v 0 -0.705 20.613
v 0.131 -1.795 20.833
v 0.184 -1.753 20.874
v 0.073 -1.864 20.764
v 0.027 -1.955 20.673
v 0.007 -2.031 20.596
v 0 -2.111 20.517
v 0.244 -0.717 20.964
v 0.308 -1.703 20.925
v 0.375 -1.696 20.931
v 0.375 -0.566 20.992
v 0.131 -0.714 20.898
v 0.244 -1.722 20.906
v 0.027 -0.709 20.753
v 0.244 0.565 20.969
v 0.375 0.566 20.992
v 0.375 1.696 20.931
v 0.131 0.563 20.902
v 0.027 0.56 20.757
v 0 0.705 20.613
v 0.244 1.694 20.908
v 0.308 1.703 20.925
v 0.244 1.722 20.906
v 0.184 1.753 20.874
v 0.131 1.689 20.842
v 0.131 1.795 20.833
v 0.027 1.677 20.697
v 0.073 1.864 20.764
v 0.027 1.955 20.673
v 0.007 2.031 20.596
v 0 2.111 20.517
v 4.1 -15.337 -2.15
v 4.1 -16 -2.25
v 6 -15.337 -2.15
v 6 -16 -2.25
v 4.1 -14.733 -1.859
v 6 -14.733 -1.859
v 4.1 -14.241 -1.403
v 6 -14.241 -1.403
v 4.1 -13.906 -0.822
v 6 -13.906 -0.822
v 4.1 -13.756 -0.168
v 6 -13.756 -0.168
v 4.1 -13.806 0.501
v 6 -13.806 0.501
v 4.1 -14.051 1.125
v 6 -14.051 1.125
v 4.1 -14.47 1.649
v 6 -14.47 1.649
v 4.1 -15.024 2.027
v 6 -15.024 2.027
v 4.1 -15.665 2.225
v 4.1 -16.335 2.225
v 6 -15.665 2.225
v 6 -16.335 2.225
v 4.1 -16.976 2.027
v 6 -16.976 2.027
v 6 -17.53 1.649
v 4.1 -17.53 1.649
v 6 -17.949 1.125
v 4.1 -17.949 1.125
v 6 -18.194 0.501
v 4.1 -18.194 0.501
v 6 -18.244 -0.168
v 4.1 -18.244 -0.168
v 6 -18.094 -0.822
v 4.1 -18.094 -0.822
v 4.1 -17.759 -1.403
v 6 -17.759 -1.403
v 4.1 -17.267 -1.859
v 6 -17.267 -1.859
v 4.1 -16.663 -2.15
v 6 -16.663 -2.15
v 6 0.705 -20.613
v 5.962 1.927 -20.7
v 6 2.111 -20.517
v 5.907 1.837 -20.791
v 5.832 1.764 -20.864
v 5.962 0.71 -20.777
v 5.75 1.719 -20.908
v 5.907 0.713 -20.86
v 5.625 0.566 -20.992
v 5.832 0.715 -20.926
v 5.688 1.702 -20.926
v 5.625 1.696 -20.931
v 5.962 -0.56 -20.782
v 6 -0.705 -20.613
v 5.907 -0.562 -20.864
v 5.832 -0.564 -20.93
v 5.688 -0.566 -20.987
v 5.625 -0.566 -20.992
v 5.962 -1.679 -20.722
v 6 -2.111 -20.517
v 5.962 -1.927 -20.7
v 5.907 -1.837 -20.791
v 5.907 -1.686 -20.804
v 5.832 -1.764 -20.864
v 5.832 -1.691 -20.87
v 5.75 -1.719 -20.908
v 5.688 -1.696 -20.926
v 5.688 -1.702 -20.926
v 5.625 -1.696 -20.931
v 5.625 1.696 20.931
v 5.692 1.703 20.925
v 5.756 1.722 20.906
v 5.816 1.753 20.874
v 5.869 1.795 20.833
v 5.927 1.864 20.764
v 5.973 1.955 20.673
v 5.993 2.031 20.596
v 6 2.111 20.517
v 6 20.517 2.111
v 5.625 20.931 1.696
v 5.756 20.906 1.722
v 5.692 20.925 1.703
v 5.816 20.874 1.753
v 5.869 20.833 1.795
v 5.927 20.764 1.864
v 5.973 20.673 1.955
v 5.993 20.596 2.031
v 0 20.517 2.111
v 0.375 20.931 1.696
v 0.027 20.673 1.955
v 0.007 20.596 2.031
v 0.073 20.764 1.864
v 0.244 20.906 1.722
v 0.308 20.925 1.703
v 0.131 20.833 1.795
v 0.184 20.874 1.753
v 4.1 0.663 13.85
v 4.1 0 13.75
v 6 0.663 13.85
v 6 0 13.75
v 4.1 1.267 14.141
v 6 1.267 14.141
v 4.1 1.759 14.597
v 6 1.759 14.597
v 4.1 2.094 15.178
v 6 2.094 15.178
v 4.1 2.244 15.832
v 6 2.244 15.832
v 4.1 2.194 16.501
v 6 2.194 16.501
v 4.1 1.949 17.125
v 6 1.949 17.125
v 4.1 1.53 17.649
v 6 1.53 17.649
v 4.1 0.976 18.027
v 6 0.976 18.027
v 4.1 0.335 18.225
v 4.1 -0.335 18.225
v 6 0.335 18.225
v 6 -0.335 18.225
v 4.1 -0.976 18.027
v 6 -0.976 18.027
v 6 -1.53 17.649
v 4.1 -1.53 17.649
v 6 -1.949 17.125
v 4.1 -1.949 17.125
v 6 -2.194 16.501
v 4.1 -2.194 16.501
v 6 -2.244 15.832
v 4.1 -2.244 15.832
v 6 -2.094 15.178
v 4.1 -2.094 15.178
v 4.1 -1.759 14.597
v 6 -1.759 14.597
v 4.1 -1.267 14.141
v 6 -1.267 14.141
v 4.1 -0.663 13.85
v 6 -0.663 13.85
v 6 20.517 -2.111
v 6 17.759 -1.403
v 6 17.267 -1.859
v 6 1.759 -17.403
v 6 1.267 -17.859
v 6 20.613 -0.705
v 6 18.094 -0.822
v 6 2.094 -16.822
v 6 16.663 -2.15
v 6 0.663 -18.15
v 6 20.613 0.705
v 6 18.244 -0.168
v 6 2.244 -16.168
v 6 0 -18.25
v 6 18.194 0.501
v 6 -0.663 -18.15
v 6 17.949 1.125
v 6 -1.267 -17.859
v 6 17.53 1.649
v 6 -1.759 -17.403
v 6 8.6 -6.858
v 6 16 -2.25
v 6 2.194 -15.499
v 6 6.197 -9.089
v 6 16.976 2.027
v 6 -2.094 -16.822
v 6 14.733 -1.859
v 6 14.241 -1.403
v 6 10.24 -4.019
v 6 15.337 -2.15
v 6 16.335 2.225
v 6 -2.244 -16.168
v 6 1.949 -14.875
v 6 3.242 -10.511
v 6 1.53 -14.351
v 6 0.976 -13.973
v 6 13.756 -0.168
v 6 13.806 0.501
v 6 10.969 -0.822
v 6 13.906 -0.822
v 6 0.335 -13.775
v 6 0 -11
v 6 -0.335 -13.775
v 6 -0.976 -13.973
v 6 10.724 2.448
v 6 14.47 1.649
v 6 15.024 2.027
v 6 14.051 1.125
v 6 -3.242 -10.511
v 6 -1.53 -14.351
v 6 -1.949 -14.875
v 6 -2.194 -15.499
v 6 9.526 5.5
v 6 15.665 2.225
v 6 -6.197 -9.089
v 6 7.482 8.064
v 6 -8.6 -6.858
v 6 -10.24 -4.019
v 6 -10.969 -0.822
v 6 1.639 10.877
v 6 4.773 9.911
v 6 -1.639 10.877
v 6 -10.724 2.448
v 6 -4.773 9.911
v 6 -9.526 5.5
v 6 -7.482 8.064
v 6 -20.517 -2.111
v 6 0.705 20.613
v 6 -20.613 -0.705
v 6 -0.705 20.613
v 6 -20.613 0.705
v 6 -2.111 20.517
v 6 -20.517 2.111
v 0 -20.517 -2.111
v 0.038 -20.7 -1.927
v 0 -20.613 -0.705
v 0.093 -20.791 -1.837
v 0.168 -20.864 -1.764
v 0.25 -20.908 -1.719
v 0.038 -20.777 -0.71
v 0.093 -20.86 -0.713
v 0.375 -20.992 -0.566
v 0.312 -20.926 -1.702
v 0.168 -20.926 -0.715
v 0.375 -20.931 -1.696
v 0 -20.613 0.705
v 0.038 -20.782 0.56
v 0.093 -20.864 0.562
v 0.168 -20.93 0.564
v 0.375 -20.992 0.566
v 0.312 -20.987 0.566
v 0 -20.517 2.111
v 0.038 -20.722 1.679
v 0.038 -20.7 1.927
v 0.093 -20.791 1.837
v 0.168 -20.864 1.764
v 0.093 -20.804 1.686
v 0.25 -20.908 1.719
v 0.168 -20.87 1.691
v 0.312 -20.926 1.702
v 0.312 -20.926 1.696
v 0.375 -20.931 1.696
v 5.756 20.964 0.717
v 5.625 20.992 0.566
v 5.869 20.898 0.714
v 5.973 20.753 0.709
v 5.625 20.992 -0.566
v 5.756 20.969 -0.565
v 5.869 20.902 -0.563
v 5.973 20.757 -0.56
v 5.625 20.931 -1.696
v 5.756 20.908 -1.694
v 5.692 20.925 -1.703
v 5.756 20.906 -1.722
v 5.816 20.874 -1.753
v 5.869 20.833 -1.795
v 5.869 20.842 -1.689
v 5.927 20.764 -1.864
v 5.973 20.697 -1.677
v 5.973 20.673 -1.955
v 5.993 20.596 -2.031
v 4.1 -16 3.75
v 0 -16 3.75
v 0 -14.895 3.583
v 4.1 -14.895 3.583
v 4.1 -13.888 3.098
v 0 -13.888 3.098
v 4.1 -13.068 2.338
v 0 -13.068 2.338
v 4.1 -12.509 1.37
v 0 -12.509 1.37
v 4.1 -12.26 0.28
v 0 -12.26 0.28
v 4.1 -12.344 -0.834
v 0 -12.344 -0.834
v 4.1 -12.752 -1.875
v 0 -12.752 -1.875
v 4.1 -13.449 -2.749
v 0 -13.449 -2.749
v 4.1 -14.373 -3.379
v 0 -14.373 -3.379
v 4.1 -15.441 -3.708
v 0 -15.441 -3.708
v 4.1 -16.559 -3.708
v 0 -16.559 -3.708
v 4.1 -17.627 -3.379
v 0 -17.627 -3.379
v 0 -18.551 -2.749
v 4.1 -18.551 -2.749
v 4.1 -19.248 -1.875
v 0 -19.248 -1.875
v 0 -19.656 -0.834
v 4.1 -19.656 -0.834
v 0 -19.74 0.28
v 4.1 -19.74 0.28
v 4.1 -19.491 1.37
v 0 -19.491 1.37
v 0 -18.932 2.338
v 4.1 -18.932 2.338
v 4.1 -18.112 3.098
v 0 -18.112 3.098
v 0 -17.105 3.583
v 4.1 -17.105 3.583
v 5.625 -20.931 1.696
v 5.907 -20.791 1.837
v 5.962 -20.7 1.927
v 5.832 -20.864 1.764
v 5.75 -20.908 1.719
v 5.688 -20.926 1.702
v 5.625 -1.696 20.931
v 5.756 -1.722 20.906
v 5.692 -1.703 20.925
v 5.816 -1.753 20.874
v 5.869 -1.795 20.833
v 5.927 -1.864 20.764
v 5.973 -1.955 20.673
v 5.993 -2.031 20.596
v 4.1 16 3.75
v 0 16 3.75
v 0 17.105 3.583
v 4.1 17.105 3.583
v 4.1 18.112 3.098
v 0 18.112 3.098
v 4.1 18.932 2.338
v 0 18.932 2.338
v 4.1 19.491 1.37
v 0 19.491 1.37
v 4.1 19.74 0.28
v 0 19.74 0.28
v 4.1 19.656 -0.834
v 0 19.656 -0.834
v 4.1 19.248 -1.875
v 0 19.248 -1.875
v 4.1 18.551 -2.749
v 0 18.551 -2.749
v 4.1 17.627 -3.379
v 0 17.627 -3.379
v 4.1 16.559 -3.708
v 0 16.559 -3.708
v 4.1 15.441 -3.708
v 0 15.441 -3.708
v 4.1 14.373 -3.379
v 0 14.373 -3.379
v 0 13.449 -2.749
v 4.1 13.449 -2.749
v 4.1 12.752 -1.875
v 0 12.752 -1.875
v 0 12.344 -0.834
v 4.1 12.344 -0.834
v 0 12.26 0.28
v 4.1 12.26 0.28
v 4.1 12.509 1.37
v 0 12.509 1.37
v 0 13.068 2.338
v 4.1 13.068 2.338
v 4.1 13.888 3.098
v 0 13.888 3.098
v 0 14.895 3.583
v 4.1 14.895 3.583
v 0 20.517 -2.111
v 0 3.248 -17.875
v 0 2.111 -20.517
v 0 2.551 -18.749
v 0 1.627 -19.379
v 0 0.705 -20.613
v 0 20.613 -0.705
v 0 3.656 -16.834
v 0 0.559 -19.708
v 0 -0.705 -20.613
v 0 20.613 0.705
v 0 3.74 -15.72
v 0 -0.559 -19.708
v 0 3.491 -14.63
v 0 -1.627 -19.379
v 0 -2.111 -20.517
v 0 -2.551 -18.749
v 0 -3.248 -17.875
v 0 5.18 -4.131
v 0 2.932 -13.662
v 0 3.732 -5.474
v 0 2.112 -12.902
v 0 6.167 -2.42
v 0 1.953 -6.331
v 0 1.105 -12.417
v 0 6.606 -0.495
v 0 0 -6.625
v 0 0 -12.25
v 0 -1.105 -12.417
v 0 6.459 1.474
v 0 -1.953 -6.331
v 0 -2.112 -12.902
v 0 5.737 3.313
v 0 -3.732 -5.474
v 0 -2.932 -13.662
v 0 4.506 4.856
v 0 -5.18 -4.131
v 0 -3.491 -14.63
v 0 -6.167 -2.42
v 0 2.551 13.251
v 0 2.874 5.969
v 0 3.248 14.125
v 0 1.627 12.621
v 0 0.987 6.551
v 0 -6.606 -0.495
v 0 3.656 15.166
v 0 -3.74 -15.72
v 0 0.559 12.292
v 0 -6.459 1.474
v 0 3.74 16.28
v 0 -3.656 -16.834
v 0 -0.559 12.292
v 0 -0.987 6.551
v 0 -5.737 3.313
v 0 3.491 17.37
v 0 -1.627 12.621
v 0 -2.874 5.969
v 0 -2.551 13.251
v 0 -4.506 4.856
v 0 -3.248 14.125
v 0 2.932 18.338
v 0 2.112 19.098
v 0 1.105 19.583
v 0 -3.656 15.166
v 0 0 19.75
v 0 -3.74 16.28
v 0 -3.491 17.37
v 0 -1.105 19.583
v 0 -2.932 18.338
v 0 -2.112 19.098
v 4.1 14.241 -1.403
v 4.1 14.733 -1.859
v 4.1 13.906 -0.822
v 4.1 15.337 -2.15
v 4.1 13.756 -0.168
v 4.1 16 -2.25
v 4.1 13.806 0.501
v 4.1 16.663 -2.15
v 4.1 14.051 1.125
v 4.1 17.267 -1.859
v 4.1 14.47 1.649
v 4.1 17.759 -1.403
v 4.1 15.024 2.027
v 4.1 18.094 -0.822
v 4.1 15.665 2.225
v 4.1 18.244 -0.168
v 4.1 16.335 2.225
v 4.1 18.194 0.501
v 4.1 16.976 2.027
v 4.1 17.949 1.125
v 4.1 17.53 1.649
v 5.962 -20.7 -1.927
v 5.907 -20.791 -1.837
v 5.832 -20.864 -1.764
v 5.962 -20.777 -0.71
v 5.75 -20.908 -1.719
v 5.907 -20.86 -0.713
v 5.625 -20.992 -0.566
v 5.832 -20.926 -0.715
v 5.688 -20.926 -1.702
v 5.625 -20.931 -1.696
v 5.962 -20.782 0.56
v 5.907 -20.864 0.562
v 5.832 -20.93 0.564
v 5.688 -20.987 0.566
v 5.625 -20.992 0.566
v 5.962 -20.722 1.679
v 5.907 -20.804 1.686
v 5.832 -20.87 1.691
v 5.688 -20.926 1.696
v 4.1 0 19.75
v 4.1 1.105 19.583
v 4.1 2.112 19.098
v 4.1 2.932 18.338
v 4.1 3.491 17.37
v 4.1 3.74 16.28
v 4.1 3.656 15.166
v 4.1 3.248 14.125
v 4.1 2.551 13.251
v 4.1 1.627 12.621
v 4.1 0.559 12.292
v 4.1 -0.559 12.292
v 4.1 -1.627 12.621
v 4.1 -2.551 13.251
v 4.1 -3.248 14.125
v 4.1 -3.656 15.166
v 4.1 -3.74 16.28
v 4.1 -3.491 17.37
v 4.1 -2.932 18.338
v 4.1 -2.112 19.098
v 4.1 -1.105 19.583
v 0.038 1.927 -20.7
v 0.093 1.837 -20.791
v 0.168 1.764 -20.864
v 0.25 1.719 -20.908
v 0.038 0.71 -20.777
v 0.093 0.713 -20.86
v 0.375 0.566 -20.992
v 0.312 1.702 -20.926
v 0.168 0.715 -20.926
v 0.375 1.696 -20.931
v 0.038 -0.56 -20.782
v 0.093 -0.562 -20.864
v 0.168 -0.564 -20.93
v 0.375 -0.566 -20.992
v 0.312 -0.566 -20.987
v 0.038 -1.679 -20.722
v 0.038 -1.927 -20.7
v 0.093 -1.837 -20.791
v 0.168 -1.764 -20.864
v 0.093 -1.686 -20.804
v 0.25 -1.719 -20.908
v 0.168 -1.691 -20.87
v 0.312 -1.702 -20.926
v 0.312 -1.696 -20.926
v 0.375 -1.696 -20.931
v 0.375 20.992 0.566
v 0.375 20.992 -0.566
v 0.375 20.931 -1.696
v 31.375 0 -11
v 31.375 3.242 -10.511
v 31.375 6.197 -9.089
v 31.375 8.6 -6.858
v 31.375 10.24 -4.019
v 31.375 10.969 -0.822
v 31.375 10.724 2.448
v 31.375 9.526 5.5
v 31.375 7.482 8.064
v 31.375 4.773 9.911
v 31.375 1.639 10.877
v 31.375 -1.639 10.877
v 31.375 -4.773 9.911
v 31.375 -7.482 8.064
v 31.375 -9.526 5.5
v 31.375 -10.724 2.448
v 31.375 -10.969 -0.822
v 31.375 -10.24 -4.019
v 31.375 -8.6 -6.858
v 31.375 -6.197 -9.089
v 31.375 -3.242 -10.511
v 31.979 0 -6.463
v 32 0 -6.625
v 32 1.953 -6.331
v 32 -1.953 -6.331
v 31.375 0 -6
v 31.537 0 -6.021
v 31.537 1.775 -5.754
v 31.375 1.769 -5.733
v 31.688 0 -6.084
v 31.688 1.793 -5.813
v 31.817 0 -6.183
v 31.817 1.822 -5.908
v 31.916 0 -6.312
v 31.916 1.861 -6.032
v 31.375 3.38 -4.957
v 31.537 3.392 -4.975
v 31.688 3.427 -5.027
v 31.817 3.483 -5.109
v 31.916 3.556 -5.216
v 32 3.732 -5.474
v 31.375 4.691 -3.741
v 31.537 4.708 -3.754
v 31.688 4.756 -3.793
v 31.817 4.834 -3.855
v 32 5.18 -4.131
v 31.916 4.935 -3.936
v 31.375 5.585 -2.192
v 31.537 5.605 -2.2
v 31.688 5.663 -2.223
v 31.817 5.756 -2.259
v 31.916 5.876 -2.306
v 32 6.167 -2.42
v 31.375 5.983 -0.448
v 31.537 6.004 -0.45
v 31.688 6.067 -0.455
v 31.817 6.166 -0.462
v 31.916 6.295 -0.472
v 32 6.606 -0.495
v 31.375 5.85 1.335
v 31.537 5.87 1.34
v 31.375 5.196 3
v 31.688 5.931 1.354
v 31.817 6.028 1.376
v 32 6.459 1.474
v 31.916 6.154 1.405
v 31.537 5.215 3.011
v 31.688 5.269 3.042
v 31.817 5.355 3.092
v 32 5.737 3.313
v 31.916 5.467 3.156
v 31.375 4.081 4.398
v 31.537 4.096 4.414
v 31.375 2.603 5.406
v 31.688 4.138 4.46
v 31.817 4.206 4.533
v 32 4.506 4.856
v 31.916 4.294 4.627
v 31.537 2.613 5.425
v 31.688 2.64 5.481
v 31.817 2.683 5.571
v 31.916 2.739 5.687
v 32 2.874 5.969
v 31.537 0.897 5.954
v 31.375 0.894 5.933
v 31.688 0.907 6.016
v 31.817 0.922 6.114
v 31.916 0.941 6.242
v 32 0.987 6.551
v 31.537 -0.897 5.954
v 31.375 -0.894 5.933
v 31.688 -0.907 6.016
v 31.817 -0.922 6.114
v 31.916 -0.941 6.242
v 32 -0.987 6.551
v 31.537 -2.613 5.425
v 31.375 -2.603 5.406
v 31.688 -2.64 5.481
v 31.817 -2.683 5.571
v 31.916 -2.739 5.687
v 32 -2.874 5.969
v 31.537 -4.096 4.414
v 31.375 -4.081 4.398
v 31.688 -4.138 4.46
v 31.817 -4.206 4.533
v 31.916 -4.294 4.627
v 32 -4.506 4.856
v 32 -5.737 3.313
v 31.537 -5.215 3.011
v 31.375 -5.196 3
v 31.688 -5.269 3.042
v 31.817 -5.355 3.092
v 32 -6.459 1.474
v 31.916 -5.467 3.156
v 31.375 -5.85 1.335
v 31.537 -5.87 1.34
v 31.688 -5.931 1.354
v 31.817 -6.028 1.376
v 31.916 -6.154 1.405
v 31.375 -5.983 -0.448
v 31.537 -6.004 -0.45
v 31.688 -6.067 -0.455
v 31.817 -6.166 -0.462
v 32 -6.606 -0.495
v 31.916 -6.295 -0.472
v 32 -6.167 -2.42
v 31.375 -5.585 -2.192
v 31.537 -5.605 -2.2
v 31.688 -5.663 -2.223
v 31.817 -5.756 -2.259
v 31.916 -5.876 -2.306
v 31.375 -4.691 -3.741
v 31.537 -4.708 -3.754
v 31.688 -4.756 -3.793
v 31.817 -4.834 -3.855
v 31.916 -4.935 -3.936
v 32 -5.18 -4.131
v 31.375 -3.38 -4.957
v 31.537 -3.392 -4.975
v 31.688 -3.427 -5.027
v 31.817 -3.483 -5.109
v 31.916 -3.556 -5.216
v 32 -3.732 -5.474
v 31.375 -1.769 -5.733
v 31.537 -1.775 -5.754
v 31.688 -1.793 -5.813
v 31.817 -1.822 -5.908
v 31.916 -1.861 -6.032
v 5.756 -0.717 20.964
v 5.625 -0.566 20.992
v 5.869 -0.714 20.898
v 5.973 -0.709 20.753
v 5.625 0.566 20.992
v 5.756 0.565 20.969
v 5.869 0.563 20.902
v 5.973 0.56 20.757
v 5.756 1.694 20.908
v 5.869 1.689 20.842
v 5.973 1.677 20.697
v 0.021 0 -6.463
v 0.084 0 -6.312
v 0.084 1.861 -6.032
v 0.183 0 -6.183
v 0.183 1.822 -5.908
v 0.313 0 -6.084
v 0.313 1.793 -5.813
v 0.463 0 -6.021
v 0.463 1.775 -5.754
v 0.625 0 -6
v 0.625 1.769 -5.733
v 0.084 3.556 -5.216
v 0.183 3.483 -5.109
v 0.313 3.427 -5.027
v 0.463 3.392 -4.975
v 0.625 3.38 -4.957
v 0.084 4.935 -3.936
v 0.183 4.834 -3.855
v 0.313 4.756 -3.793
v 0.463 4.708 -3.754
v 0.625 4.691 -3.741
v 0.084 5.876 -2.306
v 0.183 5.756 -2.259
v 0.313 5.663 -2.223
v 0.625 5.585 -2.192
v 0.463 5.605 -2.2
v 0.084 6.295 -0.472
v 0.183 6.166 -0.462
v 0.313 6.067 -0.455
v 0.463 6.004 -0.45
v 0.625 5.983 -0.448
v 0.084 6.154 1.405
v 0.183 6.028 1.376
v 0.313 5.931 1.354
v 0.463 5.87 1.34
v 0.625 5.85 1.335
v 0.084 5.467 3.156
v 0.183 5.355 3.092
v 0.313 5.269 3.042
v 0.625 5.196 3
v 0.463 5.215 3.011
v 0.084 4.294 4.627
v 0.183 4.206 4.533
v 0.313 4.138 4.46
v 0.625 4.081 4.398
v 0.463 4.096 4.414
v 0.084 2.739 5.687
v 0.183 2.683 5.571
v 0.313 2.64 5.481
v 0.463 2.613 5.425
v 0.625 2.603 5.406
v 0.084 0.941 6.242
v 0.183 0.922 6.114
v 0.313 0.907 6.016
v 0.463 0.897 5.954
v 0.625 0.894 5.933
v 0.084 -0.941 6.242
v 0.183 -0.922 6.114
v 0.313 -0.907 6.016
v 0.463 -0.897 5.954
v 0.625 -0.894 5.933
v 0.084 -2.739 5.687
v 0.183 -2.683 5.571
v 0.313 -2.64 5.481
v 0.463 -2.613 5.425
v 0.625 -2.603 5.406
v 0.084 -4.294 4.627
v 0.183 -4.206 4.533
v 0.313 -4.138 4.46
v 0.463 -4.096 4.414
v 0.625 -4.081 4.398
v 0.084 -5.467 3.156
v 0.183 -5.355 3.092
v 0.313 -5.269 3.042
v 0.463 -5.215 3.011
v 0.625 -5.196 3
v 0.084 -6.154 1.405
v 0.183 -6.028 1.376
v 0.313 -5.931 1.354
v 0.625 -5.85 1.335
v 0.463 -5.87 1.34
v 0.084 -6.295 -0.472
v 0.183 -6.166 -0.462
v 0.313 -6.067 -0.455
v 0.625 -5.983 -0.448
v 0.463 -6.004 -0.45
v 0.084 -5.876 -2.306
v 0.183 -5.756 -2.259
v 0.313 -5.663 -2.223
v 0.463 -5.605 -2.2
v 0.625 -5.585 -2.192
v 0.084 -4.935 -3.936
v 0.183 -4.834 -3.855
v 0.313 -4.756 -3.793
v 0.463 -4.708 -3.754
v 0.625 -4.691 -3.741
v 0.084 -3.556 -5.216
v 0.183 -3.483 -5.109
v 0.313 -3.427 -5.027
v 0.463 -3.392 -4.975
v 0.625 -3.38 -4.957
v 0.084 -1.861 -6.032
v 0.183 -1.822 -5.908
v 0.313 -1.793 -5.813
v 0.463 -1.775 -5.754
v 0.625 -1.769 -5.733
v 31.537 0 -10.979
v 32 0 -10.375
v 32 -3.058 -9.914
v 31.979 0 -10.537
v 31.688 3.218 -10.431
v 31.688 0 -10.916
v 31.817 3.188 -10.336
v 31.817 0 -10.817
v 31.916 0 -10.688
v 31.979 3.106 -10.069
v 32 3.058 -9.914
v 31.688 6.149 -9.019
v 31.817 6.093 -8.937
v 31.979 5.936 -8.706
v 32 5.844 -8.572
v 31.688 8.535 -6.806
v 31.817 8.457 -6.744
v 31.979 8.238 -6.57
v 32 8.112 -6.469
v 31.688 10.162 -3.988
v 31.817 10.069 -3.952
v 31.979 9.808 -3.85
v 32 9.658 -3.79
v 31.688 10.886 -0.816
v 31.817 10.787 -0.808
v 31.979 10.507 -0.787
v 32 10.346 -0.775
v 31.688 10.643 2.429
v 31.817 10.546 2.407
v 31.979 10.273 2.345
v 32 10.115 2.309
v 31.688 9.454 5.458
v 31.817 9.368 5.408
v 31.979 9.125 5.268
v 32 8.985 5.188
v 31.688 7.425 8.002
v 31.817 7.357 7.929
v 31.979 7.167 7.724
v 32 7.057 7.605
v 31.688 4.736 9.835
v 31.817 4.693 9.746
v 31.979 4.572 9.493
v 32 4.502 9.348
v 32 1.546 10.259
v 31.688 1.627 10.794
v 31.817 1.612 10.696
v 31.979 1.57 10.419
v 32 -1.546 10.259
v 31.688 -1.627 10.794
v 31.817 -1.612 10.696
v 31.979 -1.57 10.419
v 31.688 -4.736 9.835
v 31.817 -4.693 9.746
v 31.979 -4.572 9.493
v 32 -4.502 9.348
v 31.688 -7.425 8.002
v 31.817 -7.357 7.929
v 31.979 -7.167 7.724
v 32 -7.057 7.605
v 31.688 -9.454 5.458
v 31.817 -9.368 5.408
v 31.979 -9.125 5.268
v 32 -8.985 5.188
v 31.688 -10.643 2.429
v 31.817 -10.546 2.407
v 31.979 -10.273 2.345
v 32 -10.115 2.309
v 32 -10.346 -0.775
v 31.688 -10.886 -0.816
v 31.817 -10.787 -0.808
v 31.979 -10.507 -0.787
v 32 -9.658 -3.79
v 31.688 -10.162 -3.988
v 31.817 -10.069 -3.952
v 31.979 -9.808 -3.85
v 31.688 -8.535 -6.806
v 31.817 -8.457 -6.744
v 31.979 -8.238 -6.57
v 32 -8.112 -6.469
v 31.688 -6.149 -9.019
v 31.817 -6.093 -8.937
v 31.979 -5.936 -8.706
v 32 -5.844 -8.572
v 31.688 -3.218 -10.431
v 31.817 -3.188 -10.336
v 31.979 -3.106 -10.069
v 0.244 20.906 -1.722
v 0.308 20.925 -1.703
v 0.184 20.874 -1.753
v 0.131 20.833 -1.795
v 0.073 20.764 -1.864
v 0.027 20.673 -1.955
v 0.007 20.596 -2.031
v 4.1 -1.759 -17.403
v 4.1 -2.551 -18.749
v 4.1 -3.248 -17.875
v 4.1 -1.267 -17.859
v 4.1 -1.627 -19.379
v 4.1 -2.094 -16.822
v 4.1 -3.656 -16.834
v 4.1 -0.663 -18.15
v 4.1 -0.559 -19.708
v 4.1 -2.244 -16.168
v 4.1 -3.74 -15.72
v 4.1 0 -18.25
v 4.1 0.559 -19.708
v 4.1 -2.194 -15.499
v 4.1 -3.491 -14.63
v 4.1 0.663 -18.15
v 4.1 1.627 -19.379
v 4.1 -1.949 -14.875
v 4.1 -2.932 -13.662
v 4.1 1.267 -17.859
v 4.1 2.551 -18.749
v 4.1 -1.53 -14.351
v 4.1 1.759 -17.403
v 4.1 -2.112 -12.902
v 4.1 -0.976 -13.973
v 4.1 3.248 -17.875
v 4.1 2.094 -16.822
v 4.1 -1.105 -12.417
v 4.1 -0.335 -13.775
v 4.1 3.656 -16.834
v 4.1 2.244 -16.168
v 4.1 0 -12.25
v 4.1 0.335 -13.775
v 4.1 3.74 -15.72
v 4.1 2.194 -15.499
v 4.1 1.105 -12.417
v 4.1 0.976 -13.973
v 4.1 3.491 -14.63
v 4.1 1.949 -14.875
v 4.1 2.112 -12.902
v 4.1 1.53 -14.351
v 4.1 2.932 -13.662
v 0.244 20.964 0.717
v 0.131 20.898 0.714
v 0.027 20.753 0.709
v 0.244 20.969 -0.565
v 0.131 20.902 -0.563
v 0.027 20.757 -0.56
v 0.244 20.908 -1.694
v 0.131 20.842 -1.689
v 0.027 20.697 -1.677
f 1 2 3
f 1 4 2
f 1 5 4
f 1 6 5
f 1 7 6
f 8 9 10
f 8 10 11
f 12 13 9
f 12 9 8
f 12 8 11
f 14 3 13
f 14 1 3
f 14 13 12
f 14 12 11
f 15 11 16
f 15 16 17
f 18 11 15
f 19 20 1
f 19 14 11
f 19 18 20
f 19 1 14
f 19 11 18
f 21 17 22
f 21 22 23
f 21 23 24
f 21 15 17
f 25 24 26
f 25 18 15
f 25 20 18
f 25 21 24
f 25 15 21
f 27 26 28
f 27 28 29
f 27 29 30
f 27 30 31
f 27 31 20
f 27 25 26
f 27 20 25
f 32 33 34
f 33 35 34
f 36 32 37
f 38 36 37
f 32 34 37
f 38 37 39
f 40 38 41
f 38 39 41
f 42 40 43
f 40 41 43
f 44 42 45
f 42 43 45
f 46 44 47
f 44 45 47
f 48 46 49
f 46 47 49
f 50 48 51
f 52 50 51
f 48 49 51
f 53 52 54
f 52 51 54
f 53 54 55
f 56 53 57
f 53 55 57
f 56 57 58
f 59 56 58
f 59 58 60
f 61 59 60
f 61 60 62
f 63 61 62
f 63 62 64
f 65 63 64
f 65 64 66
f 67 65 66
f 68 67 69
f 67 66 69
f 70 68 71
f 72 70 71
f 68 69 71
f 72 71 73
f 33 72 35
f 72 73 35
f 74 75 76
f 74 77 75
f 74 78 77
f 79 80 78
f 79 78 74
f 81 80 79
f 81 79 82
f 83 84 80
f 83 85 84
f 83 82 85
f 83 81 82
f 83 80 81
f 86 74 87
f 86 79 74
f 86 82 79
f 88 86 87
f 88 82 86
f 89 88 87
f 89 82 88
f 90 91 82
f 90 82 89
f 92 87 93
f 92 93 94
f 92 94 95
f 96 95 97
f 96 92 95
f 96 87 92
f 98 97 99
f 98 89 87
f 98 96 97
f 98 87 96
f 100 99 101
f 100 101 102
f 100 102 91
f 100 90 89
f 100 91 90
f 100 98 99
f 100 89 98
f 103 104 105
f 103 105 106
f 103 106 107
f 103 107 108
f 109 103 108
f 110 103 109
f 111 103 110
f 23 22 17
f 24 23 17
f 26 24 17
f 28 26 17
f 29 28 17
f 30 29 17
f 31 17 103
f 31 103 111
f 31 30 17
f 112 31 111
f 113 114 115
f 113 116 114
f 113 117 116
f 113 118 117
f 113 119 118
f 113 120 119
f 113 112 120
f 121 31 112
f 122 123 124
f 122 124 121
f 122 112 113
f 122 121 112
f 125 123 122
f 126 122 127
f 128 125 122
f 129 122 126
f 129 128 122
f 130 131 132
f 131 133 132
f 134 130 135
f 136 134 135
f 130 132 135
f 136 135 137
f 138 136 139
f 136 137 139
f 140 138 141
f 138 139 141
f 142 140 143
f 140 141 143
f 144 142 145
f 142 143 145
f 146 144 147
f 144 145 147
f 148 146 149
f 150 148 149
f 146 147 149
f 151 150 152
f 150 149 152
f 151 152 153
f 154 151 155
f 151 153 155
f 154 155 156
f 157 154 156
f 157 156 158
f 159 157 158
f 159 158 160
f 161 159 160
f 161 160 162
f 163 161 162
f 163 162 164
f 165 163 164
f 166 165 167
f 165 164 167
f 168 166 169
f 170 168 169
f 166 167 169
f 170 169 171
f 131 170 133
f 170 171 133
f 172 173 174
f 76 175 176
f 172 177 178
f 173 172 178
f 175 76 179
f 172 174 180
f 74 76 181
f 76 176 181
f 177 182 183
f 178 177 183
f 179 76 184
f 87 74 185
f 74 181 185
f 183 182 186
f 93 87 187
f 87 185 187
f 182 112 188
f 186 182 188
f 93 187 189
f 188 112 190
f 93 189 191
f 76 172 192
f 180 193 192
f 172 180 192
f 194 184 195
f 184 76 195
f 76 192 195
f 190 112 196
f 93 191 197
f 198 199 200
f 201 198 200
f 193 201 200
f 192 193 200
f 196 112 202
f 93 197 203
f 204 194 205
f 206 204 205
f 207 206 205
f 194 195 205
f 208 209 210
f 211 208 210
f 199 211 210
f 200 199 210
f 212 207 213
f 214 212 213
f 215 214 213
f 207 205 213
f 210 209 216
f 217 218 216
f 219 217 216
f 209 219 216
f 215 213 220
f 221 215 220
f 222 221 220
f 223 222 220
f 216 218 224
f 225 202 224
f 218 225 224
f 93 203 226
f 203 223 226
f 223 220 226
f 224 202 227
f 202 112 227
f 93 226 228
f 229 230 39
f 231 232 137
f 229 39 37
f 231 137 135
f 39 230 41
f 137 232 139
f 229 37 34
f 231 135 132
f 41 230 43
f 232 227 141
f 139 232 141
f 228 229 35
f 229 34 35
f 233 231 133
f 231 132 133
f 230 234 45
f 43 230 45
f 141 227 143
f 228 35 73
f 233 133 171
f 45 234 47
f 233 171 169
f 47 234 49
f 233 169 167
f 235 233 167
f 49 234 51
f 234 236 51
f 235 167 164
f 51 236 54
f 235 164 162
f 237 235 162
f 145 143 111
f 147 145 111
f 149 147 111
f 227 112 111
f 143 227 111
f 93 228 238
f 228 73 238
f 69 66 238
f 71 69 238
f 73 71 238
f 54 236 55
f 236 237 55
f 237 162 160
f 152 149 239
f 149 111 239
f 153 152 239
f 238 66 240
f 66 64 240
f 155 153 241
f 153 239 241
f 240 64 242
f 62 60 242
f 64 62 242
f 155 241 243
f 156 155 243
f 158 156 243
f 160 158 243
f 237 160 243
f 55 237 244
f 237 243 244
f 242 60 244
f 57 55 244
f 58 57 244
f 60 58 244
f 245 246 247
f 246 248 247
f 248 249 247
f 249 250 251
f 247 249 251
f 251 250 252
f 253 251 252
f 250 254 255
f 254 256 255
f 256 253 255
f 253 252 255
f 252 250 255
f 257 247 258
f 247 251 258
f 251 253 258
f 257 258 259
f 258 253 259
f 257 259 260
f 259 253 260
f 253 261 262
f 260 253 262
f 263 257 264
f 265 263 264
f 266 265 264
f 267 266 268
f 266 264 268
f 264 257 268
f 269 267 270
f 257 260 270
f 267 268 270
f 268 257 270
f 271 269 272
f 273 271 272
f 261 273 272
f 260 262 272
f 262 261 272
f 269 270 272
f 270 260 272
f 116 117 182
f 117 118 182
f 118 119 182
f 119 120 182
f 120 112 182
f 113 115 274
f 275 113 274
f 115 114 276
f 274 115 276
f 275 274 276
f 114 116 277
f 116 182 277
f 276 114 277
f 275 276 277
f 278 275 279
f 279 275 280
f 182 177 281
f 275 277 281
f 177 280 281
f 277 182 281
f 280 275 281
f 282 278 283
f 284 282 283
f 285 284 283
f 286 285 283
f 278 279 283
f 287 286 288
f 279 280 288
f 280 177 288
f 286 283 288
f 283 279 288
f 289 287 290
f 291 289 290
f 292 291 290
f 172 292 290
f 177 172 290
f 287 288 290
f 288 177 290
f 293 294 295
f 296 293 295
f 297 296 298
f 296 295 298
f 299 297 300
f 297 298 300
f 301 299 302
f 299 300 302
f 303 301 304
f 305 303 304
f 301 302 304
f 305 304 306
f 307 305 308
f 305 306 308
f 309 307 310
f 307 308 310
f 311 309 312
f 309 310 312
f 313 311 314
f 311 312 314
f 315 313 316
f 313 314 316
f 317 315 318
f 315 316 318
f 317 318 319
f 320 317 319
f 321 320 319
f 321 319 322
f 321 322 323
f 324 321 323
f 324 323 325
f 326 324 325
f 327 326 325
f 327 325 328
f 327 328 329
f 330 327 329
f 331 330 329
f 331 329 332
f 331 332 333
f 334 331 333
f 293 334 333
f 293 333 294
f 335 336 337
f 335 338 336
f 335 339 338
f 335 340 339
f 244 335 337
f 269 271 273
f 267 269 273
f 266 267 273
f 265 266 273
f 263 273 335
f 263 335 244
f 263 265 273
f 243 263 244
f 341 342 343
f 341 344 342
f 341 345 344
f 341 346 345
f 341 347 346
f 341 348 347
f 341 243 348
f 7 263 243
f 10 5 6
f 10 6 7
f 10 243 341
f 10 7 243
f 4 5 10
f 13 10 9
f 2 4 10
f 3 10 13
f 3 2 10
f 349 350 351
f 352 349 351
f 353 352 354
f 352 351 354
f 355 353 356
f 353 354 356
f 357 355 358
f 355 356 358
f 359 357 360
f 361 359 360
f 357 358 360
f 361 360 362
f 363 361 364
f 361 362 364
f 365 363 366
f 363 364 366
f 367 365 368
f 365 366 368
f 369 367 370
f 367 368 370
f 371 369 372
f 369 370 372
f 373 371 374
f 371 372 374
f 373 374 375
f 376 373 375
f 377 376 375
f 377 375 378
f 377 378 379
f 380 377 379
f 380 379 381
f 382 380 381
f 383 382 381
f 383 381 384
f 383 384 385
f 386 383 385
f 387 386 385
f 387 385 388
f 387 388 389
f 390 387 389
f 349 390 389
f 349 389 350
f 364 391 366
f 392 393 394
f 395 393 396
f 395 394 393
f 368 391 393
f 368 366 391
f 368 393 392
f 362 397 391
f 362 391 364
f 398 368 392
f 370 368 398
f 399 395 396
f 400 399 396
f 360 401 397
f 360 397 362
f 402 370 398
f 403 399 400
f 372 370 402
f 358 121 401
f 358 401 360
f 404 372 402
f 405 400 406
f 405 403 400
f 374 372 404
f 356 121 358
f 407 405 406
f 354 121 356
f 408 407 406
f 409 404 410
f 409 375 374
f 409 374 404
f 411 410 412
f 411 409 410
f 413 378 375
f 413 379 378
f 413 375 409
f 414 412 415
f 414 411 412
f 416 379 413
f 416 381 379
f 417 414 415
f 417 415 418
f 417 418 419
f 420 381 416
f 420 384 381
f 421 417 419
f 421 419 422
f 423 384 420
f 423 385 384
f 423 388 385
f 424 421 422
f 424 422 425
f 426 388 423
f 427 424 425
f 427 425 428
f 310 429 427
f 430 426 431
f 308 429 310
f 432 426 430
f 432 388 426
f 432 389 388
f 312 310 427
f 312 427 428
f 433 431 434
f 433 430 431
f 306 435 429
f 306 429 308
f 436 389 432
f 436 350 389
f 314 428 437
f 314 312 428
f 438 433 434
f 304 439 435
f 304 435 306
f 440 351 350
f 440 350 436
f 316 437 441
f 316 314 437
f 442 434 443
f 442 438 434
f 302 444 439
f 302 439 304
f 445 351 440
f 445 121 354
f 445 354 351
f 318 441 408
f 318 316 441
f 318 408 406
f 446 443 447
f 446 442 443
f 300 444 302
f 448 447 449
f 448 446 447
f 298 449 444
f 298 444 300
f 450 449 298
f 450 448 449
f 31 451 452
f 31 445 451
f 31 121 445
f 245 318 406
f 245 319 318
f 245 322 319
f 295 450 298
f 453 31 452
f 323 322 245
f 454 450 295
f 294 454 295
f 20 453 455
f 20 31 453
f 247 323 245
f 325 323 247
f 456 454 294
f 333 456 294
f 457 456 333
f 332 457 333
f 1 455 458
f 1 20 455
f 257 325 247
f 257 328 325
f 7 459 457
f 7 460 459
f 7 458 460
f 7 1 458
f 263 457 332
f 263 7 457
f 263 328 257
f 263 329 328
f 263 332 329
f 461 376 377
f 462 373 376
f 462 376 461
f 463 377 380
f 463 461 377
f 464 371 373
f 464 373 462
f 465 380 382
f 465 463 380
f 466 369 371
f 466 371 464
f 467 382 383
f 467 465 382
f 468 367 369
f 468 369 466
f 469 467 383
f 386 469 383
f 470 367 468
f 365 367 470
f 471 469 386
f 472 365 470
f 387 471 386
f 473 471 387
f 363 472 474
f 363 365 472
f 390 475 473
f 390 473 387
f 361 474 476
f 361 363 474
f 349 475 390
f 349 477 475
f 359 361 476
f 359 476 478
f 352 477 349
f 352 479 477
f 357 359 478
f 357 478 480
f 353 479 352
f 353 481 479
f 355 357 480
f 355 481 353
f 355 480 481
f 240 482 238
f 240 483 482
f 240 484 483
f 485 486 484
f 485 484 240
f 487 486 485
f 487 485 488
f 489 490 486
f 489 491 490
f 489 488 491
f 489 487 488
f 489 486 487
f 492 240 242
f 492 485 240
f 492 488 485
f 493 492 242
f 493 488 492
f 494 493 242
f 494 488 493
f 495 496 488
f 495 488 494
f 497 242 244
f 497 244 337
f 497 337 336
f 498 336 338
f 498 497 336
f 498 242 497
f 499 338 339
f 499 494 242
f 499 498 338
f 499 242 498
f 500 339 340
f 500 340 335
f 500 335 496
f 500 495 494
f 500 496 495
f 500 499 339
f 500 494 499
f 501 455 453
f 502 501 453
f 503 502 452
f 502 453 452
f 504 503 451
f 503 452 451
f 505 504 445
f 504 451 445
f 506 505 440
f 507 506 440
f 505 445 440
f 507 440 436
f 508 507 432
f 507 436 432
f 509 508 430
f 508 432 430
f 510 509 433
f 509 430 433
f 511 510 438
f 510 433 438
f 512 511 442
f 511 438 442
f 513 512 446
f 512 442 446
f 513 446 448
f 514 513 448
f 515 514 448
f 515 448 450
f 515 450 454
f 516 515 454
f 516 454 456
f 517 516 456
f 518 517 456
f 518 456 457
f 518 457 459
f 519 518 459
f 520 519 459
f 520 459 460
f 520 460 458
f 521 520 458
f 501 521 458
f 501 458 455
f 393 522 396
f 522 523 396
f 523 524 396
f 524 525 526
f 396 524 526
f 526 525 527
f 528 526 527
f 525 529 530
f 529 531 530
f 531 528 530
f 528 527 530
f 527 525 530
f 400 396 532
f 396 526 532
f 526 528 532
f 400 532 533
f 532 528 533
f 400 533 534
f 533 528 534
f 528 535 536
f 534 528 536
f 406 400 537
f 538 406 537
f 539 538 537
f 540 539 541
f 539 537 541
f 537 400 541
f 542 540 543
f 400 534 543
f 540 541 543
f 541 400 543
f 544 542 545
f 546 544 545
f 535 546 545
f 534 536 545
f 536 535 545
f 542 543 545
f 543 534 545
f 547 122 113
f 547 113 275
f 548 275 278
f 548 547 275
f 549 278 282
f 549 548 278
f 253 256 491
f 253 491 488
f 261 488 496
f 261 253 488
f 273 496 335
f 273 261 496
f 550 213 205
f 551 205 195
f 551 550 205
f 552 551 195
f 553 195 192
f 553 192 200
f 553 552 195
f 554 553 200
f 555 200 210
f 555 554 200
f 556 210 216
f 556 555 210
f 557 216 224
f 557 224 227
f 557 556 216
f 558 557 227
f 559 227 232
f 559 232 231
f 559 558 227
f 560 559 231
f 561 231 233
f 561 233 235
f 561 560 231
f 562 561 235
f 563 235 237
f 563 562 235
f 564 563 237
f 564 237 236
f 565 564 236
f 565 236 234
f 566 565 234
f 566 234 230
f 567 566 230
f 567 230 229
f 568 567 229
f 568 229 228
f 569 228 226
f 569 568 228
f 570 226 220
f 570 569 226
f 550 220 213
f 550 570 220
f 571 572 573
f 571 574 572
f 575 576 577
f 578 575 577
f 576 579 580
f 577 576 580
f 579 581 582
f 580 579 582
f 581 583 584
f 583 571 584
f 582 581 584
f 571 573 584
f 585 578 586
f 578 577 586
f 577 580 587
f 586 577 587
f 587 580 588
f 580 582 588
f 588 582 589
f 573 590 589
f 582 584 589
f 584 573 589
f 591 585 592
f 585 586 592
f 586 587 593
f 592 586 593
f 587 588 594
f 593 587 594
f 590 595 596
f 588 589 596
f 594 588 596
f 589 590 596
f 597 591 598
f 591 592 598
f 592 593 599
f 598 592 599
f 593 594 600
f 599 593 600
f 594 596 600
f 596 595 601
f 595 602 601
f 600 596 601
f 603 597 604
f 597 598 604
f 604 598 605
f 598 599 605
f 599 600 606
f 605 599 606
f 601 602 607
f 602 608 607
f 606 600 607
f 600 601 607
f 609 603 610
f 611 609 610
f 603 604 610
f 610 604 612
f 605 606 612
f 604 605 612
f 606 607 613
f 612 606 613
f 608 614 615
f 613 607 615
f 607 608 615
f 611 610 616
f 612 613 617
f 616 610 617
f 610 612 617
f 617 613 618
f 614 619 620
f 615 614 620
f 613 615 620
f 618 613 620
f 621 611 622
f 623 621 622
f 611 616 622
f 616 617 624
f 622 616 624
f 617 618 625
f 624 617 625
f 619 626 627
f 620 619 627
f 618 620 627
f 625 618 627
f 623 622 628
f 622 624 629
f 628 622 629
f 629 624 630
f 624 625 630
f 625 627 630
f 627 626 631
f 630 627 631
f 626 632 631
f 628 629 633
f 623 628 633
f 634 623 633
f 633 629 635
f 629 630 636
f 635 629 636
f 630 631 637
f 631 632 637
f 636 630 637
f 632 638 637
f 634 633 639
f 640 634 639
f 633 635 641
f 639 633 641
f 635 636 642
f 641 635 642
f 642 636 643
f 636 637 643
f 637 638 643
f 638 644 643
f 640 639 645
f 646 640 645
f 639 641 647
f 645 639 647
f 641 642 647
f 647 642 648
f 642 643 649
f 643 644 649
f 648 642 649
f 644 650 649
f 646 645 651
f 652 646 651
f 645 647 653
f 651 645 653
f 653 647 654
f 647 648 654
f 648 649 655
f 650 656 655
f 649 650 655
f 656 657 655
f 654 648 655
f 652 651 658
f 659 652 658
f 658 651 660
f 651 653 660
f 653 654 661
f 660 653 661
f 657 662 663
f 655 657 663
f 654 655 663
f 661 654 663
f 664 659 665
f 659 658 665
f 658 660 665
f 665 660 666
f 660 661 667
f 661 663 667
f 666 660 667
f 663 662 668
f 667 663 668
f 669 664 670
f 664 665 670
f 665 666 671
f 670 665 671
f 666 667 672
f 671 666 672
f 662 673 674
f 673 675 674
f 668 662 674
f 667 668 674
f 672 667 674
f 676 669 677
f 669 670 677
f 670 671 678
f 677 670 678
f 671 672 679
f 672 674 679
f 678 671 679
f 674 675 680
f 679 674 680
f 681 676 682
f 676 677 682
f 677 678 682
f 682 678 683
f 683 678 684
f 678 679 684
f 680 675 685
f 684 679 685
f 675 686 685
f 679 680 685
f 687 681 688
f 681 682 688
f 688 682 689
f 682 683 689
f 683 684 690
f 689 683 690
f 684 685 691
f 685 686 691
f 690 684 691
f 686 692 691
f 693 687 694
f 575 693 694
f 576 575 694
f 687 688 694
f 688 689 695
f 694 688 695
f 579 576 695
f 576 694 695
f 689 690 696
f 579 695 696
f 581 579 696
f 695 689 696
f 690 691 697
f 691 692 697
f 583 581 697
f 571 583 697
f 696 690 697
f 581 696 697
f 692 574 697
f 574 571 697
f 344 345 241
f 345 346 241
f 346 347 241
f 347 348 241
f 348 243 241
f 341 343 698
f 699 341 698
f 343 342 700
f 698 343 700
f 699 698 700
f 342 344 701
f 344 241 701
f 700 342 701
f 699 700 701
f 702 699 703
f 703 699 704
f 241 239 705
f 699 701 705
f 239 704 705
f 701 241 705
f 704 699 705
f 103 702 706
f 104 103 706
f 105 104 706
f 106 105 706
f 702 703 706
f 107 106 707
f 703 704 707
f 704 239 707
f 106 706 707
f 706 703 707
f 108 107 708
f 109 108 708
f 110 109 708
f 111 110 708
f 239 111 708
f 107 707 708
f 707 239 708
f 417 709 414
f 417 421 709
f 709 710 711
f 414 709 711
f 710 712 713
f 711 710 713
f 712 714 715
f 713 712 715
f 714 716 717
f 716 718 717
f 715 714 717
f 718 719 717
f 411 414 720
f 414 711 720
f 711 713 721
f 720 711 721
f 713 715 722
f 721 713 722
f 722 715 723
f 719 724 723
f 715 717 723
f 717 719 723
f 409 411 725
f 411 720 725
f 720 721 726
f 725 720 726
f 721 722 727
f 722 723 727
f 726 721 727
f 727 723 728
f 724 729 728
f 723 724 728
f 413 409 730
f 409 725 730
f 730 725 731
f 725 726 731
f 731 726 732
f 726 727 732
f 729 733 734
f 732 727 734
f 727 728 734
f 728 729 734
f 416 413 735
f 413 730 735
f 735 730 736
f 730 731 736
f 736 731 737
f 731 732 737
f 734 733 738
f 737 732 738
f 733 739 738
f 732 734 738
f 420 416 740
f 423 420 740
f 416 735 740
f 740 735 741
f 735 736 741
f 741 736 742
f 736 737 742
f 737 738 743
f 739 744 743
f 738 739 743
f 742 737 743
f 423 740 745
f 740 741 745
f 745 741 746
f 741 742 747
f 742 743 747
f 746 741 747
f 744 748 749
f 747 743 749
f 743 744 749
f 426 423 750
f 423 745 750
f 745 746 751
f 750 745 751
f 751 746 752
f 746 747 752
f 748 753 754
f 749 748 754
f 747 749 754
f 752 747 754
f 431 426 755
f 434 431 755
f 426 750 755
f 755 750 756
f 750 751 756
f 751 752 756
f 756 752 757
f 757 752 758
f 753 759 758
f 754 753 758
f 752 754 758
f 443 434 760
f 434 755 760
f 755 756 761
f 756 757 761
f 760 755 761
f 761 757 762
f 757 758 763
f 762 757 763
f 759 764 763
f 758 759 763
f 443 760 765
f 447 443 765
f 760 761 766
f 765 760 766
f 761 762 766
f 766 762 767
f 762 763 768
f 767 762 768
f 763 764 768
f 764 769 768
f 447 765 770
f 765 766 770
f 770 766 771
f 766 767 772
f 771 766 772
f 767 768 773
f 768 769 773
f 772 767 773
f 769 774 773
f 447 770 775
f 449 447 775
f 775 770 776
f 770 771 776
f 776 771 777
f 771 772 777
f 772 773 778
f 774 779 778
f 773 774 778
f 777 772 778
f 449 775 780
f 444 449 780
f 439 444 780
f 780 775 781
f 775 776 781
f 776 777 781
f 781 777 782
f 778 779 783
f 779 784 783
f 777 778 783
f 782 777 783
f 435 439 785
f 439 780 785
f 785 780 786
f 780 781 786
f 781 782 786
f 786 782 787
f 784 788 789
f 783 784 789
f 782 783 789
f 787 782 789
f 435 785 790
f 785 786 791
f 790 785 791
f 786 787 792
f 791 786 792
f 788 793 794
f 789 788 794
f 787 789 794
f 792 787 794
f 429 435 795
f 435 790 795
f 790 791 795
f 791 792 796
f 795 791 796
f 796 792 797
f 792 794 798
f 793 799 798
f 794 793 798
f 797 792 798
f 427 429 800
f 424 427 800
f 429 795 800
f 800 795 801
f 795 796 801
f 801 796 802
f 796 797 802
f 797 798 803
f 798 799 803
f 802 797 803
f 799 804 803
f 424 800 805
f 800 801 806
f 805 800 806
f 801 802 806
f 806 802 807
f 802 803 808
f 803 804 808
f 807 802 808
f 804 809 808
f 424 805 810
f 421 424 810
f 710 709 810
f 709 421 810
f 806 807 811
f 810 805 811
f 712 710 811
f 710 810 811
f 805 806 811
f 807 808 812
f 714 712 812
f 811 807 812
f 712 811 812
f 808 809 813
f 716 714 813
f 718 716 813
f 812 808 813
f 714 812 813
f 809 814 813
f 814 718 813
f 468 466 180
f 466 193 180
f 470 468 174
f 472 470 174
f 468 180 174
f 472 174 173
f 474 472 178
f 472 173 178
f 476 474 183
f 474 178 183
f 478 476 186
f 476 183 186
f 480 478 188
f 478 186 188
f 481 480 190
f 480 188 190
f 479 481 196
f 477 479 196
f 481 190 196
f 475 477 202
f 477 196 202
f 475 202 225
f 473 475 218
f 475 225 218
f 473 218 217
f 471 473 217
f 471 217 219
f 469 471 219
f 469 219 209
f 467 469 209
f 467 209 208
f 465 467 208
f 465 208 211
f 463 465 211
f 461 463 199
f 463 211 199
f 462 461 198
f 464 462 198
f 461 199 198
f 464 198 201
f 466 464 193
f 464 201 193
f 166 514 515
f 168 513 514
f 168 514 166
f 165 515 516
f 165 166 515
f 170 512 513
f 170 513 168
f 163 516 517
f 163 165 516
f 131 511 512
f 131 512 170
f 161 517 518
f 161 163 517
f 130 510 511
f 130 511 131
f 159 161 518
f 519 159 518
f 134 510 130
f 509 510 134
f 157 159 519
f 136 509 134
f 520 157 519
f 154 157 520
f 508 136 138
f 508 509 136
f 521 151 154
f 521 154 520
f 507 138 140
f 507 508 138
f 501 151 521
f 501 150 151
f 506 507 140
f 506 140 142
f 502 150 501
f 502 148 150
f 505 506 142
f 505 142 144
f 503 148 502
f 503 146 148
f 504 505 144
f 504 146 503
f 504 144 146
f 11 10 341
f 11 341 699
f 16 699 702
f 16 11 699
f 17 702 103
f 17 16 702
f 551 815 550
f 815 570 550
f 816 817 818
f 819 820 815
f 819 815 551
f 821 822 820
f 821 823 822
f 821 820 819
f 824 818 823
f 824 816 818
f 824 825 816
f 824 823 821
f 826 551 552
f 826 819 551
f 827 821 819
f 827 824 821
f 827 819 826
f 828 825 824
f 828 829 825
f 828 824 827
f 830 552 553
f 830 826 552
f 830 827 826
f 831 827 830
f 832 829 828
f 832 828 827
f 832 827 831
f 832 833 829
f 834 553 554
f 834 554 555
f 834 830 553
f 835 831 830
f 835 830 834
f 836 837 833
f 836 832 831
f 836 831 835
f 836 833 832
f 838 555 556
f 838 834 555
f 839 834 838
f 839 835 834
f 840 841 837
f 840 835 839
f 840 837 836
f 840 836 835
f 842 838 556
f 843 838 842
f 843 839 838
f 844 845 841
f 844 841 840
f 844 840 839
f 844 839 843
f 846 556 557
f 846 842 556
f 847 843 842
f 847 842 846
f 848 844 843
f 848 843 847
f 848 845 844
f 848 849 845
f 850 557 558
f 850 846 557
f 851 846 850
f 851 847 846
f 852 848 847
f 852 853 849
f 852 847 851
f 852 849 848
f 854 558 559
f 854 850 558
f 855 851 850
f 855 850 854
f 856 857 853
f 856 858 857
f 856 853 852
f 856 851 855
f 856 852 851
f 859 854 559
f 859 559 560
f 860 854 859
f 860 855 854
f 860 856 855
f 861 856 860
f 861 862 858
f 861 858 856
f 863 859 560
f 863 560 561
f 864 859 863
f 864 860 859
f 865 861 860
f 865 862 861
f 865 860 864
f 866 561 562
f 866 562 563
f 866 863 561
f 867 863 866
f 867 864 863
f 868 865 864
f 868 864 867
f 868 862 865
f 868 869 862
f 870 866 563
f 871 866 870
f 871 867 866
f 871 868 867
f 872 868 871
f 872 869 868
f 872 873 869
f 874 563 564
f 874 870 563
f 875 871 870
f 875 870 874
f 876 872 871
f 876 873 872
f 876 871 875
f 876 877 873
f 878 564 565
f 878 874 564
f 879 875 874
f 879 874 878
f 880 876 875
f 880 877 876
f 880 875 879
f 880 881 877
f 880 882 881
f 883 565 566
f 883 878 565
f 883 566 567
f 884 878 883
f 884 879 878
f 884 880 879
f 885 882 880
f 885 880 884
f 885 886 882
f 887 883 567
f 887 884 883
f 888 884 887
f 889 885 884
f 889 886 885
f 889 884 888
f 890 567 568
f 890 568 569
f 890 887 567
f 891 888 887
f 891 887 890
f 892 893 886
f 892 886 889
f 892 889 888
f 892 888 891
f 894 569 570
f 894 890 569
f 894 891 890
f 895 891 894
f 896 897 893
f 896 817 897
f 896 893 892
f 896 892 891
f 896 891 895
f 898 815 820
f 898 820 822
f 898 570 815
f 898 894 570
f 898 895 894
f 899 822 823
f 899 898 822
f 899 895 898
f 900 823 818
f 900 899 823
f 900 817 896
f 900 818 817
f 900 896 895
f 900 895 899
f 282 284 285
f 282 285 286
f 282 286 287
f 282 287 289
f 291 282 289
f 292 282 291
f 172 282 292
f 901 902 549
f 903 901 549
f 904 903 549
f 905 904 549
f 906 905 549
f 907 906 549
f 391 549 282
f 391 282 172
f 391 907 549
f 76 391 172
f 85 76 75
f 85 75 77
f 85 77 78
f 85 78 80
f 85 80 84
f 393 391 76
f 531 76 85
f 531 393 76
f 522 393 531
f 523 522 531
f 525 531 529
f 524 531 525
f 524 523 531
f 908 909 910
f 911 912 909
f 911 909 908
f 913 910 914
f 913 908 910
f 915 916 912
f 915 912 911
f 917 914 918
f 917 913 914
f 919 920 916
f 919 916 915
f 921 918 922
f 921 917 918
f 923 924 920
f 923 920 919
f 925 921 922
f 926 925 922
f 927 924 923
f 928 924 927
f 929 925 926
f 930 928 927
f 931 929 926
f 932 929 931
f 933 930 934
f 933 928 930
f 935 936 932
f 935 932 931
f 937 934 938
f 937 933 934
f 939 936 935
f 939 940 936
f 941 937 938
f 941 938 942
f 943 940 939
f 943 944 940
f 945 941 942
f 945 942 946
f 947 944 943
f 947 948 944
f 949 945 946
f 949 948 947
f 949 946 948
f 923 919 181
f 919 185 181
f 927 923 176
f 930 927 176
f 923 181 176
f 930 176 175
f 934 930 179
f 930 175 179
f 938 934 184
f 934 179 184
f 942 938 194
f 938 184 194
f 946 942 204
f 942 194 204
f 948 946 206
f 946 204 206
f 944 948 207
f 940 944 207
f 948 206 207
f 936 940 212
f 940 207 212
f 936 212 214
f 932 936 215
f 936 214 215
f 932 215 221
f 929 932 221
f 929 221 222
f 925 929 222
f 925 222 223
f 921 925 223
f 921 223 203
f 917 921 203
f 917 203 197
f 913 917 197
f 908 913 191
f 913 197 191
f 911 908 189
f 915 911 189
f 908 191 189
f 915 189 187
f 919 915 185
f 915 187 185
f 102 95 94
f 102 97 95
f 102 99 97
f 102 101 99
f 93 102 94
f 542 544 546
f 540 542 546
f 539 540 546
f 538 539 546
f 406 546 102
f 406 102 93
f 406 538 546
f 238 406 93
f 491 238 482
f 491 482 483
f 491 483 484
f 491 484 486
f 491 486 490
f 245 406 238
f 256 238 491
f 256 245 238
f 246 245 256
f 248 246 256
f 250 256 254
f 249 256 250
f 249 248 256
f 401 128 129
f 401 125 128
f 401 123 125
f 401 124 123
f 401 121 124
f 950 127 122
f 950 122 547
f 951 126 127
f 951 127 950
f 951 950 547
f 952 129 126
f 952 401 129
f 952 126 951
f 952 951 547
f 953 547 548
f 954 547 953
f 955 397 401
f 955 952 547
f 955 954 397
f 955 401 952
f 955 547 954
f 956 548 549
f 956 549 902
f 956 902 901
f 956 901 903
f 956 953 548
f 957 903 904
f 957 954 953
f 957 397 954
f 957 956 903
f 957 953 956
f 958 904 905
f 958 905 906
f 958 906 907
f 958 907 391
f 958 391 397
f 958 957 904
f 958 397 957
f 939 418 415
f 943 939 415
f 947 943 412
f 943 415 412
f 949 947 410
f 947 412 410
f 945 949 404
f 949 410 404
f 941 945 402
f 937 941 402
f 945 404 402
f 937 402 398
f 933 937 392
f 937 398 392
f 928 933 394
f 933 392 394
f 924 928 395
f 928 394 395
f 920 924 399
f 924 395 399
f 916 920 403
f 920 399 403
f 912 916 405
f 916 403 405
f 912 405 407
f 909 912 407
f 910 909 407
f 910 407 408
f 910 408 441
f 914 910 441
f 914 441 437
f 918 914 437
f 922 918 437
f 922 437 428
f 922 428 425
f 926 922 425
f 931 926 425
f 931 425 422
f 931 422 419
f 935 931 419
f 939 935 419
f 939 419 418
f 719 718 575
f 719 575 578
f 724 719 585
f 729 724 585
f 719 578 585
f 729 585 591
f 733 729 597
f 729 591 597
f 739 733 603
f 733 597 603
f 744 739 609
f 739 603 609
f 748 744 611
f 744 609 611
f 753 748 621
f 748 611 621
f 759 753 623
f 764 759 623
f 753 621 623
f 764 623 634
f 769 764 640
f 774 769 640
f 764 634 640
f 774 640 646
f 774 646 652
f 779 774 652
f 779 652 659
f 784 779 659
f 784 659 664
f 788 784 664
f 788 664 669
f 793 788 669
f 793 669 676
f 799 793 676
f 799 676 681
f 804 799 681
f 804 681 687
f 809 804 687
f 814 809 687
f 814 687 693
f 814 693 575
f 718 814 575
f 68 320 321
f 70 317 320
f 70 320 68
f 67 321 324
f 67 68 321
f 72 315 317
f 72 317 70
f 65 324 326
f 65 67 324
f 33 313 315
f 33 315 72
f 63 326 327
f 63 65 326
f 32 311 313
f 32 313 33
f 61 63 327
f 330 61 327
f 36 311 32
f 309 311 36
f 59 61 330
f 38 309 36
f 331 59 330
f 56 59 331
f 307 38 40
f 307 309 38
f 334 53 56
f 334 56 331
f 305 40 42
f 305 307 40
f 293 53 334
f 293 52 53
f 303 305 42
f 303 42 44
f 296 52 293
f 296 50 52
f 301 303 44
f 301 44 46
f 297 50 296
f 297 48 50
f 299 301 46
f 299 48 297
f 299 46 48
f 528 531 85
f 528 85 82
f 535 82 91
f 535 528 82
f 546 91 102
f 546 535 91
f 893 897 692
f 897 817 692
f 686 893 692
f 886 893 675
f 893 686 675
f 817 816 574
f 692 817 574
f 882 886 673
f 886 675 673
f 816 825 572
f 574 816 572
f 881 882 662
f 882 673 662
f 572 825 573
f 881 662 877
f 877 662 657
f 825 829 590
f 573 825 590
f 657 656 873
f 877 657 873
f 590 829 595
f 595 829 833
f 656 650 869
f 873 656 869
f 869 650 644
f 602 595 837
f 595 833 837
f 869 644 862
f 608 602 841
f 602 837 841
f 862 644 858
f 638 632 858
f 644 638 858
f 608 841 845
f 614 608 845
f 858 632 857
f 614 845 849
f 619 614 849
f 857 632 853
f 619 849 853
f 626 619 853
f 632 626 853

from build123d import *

# Parameters (mm, degrees)
BOSS_EXTRUDE1_DEPTH                              = 6
SKETCH2_W                                        = 26
SKETCH2_H                                        = 11
CBORE_FOR_M4_HEX_HEAD_MACHINE_SCREW1_D           = 4.5
CBORE_FOR_M4_HEX_HEAD_MACHINE_SCREW1_DEPTH       = 32
CBORE_FOR_M4_HEX_HEAD_MACHINE_SCREW1_CBORE_D     = 7.5
CBORE_FOR_M4_HEX_HEAD_MACHINE_SCREW1_CBORE_DEPTH = 4.1
F_12_0_12_DIAMETER_HOLE1_D                       = 12
FILLET1_R                                        = 0.375
FILLET2_R                                        = 0.625


with BuildPart() as part:
    # Sketch1 → Boss-Extrude1 (new body)
    with BuildSketch(Plane(origin=(0, 0, 0), x_dir=(0, -1, 0), z_dir=(-1, 0, 0))):
        with BuildLine():
            Line((-1.696016468, 20.93140053), (-20.93140053, 1.696016468))
            ThreePointArc((-20.93140053, 1.696016468), (-21, 0), (-20.93140053, -1.696016468))
            Line((-20.93140053, -1.696016468), (-1.696016468, -20.93140053))
            ThreePointArc((-1.696016468, -20.93140053), (0, -21), (1.696016468, -20.93140053))
            Line((1.696016468, -20.93140053), (20.93140053, -1.696016468))
            ThreePointArc((20.93140053, -1.696016468), (21, 0), (20.93140053, 1.696016468))
            Line((20.93140053, 1.696016468), (1.696016468, 20.93140053))
            ThreePointArc((1.696016468, 20.93140053), (0, 21), (-1.696016468, 20.93140053))
        make_face()
    extrude(amount=-BOSS_EXTRUDE1_DEPTH)

    # Sketch2 → Revolve1 (revolve)
    with BuildSketch(Plane.XY, mode=Mode.PRIVATE) as revolve1_sk:
        with Locations((19, 5.5)):
            Rectangle(SKETCH2_W, SKETCH2_H)
    revolve(revolve1_sk.sketch.rotate(Axis((6, 0, 0), (1, 0, 0)), 270), axis=Axis((6, 0, 0), (1, 0, 0)))

    # CBORE for M4 Hex Head Machine Screw1
    with Locations(Plane.ZY):
        with Locations((0, 16), (0, -16), (-16, 0), (16, 0)):
            CounterBoreHole(CBORE_FOR_M4_HEX_HEAD_MACHINE_SCREW1_D / 2, CBORE_FOR_M4_HEX_HEAD_MACHINE_SCREW1_CBORE_D / 2, CBORE_FOR_M4_HEX_HEAD_MACHINE_SCREW1_CBORE_DEPTH, depth=CBORE_FOR_M4_HEX_HEAD_MACHINE_SCREW1_DEPTH)

    # Ø12.0 (12) Diameter Hole1 (through all)
    with Locations(Plane.ZY):
        with Locations((0, 0)):
            Hole(F_12_0_12_DIAMETER_HOLE1_D / 2)

    # Fillet1
    fillet1_edges = [part.edges().sort_by_distance(p)[0] for p in [
        (0, 21, 0),
        (0, 0, 21),
        (6, 21, 0),
        (6, 0, -21),
        (6, -21, 0),
        (6, 0, 21),
        (0, -21, 0),
        (0, 0, -21),
    ]]
    fillet(fillet1_edges, radius=FILLET1_R)

    # Fillet2
    fillet2_edges = [part.edges().sort_by_distance(p)[0] for p in [
        (32, 0, 11),
        (0, 0, 6),
        (32, 0, 6),
    ]]
    fillet(fillet2_edges, radius=FILLET2_R)


solid = part.part
